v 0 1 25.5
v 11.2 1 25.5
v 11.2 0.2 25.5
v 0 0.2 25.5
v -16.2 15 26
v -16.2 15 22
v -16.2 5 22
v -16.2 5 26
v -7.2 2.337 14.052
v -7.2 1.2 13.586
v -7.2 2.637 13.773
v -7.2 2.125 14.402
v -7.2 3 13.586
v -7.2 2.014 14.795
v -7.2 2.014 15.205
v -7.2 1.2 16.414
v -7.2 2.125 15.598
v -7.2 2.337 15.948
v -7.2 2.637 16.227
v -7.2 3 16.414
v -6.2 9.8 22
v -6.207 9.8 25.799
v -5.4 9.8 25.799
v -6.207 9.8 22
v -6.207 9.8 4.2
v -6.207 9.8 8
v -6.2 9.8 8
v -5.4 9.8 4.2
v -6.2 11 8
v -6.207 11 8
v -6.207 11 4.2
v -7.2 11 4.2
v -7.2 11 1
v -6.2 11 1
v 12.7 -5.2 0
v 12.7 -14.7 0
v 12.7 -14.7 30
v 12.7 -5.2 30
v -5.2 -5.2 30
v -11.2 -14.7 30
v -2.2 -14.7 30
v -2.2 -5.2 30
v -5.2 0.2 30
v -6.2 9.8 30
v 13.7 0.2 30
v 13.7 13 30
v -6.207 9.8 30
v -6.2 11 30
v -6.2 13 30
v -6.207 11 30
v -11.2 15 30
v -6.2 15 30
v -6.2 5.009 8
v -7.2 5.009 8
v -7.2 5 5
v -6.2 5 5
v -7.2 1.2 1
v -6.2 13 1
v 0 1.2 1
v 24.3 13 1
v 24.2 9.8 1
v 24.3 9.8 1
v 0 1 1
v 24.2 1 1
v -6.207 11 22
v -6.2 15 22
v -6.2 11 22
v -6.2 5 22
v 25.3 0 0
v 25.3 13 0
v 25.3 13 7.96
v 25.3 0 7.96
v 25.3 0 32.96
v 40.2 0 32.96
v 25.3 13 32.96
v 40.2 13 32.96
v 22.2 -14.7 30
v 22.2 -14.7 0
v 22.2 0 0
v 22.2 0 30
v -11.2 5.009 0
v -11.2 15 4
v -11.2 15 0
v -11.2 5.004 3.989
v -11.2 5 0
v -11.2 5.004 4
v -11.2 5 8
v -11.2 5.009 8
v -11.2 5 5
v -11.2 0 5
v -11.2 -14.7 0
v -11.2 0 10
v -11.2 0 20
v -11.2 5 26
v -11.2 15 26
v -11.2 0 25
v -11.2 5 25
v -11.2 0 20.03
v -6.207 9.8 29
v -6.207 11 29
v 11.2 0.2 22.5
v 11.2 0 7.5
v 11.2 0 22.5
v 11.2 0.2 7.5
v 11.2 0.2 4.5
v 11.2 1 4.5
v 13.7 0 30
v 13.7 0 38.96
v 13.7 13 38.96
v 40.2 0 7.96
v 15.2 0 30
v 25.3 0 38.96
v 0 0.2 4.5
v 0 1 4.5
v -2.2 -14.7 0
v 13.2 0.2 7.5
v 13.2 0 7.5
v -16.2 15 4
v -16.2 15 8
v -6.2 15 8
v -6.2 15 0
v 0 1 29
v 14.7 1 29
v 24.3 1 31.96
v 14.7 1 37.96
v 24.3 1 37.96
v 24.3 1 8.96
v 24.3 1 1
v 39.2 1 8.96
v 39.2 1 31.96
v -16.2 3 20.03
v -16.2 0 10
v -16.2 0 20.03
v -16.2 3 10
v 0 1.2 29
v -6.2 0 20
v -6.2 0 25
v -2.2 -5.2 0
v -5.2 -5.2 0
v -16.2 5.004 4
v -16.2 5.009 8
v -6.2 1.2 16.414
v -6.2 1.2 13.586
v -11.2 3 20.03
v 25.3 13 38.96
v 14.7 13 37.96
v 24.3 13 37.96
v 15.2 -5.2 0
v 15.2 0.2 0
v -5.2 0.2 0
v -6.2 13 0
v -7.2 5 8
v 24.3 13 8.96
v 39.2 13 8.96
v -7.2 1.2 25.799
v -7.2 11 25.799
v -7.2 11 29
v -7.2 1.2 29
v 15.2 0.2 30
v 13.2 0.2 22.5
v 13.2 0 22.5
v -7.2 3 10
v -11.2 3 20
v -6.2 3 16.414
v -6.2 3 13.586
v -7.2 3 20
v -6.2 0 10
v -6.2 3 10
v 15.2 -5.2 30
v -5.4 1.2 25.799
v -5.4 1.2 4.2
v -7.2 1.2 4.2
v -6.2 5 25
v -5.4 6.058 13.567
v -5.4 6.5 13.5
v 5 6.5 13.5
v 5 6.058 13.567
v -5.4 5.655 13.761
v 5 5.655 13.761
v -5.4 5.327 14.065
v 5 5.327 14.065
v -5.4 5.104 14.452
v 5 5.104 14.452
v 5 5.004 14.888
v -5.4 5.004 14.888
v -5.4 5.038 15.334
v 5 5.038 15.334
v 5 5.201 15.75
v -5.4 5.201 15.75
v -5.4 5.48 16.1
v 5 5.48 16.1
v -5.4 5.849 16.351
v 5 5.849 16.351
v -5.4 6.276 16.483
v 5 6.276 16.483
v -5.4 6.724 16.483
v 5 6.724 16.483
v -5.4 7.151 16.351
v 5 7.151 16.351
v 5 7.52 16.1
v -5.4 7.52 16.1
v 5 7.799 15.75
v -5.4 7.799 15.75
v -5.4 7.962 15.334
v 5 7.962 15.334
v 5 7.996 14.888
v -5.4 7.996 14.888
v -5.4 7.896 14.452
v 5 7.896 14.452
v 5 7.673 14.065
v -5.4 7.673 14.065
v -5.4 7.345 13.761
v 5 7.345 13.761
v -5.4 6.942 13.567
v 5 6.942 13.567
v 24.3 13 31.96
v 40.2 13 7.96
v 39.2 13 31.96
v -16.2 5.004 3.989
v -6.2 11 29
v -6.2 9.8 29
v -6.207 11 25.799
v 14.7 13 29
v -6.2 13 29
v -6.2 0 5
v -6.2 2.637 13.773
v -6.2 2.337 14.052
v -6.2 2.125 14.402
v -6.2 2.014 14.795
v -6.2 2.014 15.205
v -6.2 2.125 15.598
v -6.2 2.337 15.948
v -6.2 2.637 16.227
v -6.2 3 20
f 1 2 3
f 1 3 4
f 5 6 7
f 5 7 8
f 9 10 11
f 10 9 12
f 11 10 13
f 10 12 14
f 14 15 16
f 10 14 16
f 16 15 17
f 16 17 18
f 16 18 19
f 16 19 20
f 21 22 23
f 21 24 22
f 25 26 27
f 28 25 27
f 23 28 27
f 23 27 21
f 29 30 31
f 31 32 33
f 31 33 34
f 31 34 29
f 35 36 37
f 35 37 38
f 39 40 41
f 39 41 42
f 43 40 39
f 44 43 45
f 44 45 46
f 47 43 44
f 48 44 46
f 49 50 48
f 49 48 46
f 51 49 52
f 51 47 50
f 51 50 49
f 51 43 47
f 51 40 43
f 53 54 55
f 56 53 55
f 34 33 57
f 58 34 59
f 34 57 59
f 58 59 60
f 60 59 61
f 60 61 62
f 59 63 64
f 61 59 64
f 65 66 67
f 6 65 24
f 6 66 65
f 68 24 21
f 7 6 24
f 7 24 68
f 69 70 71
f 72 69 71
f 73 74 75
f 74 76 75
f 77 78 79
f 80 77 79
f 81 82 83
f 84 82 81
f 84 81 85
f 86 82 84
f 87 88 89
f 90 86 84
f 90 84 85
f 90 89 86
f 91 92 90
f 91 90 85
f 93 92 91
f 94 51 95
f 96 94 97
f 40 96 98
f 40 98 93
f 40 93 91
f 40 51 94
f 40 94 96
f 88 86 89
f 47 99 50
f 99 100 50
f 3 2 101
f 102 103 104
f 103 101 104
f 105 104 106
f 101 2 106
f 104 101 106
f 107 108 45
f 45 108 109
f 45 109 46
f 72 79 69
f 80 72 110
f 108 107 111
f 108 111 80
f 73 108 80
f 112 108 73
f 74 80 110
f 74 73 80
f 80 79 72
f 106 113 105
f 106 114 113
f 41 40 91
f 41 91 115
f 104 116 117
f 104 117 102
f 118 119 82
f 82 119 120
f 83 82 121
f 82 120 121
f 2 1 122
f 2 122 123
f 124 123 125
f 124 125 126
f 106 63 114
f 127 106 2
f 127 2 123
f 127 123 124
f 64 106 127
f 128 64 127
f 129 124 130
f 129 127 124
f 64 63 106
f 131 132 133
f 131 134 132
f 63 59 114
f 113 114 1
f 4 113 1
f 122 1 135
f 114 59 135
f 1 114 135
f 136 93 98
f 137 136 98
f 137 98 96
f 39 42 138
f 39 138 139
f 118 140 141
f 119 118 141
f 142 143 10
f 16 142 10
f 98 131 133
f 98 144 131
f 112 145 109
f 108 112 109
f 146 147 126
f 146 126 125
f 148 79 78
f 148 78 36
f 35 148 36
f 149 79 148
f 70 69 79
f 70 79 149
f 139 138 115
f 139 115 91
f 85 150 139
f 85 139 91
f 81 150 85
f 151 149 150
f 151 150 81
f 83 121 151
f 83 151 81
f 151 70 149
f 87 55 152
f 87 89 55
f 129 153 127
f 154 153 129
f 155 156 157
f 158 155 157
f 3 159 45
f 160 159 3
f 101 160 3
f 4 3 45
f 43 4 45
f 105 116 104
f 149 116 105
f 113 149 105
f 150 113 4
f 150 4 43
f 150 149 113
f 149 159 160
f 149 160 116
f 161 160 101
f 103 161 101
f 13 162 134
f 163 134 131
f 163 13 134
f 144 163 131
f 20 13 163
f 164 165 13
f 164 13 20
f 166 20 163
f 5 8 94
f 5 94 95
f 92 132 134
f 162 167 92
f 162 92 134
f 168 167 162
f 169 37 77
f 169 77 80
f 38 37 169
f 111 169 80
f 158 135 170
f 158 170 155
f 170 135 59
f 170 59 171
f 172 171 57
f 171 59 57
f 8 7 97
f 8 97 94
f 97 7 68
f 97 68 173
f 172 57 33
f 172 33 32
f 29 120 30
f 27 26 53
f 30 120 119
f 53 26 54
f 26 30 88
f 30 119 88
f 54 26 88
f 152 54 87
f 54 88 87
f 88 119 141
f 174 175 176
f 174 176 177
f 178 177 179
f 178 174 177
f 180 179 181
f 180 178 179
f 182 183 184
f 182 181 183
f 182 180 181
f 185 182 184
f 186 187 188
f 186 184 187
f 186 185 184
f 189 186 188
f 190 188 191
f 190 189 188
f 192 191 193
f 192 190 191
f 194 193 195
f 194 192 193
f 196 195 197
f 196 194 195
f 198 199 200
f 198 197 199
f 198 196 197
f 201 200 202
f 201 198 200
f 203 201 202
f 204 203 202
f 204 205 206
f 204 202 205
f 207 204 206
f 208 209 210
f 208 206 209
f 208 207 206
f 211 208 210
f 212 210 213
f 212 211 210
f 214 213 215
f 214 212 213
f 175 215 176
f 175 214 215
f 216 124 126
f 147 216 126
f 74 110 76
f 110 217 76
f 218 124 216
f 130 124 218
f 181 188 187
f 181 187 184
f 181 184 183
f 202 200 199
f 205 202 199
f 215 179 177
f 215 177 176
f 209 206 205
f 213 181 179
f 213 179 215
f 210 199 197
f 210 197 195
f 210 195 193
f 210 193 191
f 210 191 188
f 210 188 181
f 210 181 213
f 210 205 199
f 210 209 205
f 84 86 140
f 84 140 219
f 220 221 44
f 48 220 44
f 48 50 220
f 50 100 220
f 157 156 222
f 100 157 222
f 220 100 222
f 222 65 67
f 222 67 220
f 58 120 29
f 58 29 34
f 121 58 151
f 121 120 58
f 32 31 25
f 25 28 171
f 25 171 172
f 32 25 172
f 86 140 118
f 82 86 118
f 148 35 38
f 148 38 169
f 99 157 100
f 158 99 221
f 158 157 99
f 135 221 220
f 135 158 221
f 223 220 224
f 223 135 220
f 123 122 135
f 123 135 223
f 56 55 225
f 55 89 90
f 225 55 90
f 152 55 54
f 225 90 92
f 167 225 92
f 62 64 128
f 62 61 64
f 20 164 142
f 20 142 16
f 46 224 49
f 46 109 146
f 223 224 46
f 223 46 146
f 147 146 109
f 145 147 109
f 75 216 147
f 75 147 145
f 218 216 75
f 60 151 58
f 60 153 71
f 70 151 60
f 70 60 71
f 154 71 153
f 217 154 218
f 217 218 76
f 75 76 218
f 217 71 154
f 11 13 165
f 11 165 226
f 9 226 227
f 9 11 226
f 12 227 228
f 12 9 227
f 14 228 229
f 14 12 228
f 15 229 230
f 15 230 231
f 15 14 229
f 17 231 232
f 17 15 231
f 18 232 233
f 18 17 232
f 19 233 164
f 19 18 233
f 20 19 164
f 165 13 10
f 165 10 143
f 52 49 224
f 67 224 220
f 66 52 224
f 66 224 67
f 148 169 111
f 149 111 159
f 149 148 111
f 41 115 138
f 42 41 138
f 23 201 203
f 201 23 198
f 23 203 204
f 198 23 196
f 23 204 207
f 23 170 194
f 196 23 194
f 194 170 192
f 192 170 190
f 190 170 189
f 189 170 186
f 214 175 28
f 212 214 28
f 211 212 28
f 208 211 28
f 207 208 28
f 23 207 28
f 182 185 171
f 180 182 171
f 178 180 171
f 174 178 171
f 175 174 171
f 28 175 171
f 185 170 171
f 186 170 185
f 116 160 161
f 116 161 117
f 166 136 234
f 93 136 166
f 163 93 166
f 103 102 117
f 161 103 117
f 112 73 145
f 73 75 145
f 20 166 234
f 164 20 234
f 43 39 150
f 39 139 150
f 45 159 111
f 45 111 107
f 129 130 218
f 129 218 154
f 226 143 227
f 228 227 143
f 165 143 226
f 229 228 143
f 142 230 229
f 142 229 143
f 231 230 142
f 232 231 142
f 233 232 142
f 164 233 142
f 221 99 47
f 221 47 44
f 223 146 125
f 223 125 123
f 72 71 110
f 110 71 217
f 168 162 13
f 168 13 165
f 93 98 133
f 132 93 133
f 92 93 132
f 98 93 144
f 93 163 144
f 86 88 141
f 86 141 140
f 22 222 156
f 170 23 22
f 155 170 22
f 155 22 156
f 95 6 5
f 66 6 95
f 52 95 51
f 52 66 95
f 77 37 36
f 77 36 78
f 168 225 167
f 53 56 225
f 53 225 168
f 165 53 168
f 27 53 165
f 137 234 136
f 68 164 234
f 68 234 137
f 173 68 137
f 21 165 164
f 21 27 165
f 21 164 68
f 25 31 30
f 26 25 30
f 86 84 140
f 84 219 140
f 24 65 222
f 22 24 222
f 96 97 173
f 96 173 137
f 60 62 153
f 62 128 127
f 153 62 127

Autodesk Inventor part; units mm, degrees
ref_plane "YZ Plane" through (0, 0, 0) normal (1, 0, 0) x (0, 1, 0)
ref_plane "XZ Plane" through (0, 0, 0) normal (0, 1, 0) x (-1, 0, 0)
ref_plane "XY Plane" through (0, 0, 0) normal (0, 0, 1) x (1, 0, 0)
sketch "Esboço2" plane through (0, 0, 0) normal (0, 0, 1) x (1, 0, 0)
  line L0 (0, 0) -> (-5, 0)
  line L1 (-5, 0) -> (-5, -5)
  line L2 (-5, -5) -> (-2, -5)
  line L3 (-2, -5) -> (-2, -15)
  line L4 (-2, -15) -> (-5.6275, -15)
  line L5 (-5.6275, -15) -> (-5.6275, -20)
  line L6 (-5.6275, -20) -> (0, -20)
  line L7 (0, -20) -> (0, -17.5)
  line L8 (0, -17.5) -> (10, -17.5)
  line L9 (10, -17.5) -> (10, -20)
  line L10 (10, -20) -> (15, -20)
  line L11 (15, -20) -> (15, -15)
  line L12 (15, -15) -> (12.5, -15)
  line L13 (12.5, -15) -> (12.5, -5)
  line L14 (12.5, -5) -> (15, -5)
  line L15 (15, 0) -> (15, -5)
  line L16 (15, 0) -> (10, 0)
  line L17 (10, 0) -> (10, -2.5)
  line L18 (10, -2.5) -> (0, -2.5)
  line L19 (0, -2.5) -> (0, 0)
  line L20 (-2.2, -14.8) -> (-2.2, -5.2)
  line L21 (-2.2, -5.2) -> (-4.7, -5.2)
  line L22 (-2.2, -14.8) -> (-4.7, -14.8)
  line L23 (-2.2, -14.8) -> (-5.8275, -14.8)
  line L24 (-5.8275, -14.8) -> (-5.8275, -20)
  line L25 (-5.8275, -20) -> (-5.8275, -20.2)
  line L26 (-5.8275, -20.2) -> (0.2, -20.2)
  line L27 (0.2, -20.2) -> (0.2, -17.7)
  line L28 (0.2, -17.7) -> (9.8, -17.7)
  line L29 (9.8, -17.7) -> (9.8, -18.4636)
  line L30 (9.8, -18.4636) -> (9.8, -20.2)
  line L31 (9.8, -20.2) -> (15.2, -20.2)
  line L32 (15.2, -20.2) -> (15.2, -14.8)
  line L33 (15.2, -14.8) -> (12.7, -14.8)
  line L34 (12.7, -14.8) -> (12.7, -5.2)
  line L35 (12.7, -5.2) -> (15.1265, -5.2)
  line L36 (15.1265, -5.2) -> (15.2, -5.2)
  line L37 (15.2, -5.2) -> (15.2, 0)
  line L38 (-4.7, -5.2) -> (-5.2, -5.2)
  line L39 (-5.2, -5.2) -> (-5.2, 0)
  line L40 (-12.2, 0) -> (-12.2, -24.2)
  line L41 (-12.2, -24.2) -> (22.2, -24.2)
  line L42 (22.2, -24.2) -> (22.2, 0)
  line L43 (15.2, 0) -> (15.2, 0.2)
  line L44 (15.2, 0.2) -> (13.2, 0.2)
  line L45 (22.2, 0) -> (22.2, 1)
  line L46 (22.2, 1) -> (13.2, 1)
  line L47 (13.2, 1) -> (13.2, 0.2)
  line L48 (-12.2, 0) -> (-12.2, 1.2)
  line L49 (-5.2, 0) -> (-5.2, 0.2)
  line L50 (-5.2, 0.2) -> (-3.2, 0.2)
  line L51 (-3.2, 1.2) -> (-12.2, 1.2)
  line L52 (-3.2, 1.2) -> (0, 1.2)
  line L53 (0, 1.2) -> (0, 0.2)
  line L54 (0, 0.2) -> (-3.2, 0.2)
  line L55 (0.5946, -2.5) -> (0.5946, 9.5)
  line L56 (0.5946, 9.5) -> (9.5946, 9.5)
  line L57 (9.5946, 9.5) -> (9.5946, -2.5)
  line L58 (0.5946, -2.5) -> (9.5946, -2.5)
  dimension "d0" = 5
  dimension "d1" = 5
  dimension "d2" = 3
  dimension "d3" = 10
  dimension "d4" = 5
  dimension "d5" = 2.5
  dimension "d6" = 10
  dimension "d7" = 5
  dimension "d8" = 5
  dimension "d9" = 10
  dimension "d11" = 5
  dimension "d12" = 0.2
  dimension "d13" = 0.2
  dimension "d14" = 0.2
  dimension "d15" = 0.2
  dimension "d16" = 0.2
  dimension "d17" = 0.2
  dimension "d19" = 0.2
  dimension "d20" = 0.2
  dimension "d21" = 0.2
  dimension "d22" = 0.2
  dimension "d23" = 0.2
  dimension "d24" = 0.2
  dimension "d25" = 0.2
  dimension "d26" = 0.2
  dimension "d27" = 0.2
  dimension "d28" = 7
  dimension "d29" = 4
  dimension "d30" = 7
  dimension "d31" = 0.2
  dimension "d32" = 2
  dimension "d33" = 1
  dimension "d34" = 0.2
  dimension "d35" = 2
  dimension "d36" = 1
  dimension "d39" = 12
  dimension "d40" = 9
extrude "Extrusão1" add sketch "Esboço2" along normal blind 30 contours L22 L23 L24 L25 L26 L27 L28 L29 L30 L31 L32 L33 L34 L35 L36 L37 L43 L44 L47 L46 L45 L42 L41 L40 L48 L51 L52 L53 L54 L50 L49 L39 L38 L21 L20
sketch "Esboço4" plane through (-12.2, -24.2, 0) normal (-1, 0, 0) x (0, 0, 1)
  circle A0 centre (30, 27.7) radius 6 projected
  line L0 (30, 27.7) -> (0, 27.7)
  line L1 (15, 27.7) -> (15, 25.4)
  line L2 (0, 25.4) -> (30, 25.4) projected
  line L3 (0, 27.7) -> (30, 27.7)
  line L4 (30, 27.7) -> (30, 25.4)
  line L5 (30, 25.4) -> (0, 25.4)
  line L6 (0, 25.4) -> (0, 27.7)
  point P0 (0, 24.2)
extrude "Extrusão2" add sketch "Esboço4" against normal blind 5 contours L0 L4 L2 A0 | A0 L2 L1 L0 | L1 L2 L6 L0 picked at (28.1528, 26.1667)
sketch "Esboço5" plane through (-7.2, -24.2, 0) normal (1, 0, 0) x (0, 0, -1)
  line L0 (-30, 27.7) -> (0, 27.7) projected
  line L1 (0, 27.7) -> (-15, 27.7)
  circle A0 centre (-15, 27.7) radius 1.5
  point P0 (0, 24.2)
  dimension "d48" = 3
extrude "Extrusão3" add sketch "Esboço5" along normal blind 13.7
sketch "Esboço6" plane through (-7.2, -24.2, 0) normal (-1, 0, 0) x (0, 0, 1)
  line L0 (13.5, 27.7) -> (16.5, 27.7) projected
  circle A0 centre (15, 27.7) radius 1.5
  point P0 (0, 24.2)
extrude "Extrusão4" add sketch "Esboço6" along normal blind 5 contours A0 L0 picked at (15.4855, 27.8197)
sketch "Esboço7" plane through (-12.2, -24.2, 0) normal (-1, 0, 0) x (0, 0, 1)
  circle A0 centre (30, 27.7) radius 6 projected
  line L0 (13.5, 27.7) -> (0, 27.7) projected
  line L1 (30, 33.7) -> (0, 33.7)
  line L2 (0, 33.7) -> (0, 27.7)
  line L3 (0, 27.7) -> (30, 27.7)
  line L4 (30, 27.7) -> (30, 33.7)
  point P0 (0, 24.2)
extrude "Extrusão5" add sketch "Esboço7" against normal blind 5 contours L4 L3 A0 | A0 L3 L0 L2 L1 picked at (26.0501, 28.145)
sketch "Esboço8" plane through (-12.2, -24.2, 0) normal (-1, 0, 0) x (0, 0, 1)
  line L0 (30, 33.7) -> (0, 33.7) projected
  line L1 (0, 33.7) -> (0, 35.2)
  line L2 (0, 35.2) -> (30, 35.2)
  line L3 (30, 35.2) -> (30, 33.7)
  line L4 (30, 33.7) -> (0, 33.7)
  line L5 (30, 33.7) -> (30, 25.4) projected
  point P0 (0, 24.2)
  dimension "d55" = 1.5
extrude "Extrusão6" add sketch "Esboço8" against normal blind 5
sketch "Esboço10" plane through (13.2, 1, 0) normal (0, 1, 0) x (1, 0, 0)
  line L0 (-6.7, -16.5) -> (-6.7, -13.5) projected
  line L1 (-6.7, -15) -> (-6.7, -21.5)
  line L2 (-6.7, -15) -> (-6.7, -8.5)
  line L3 (0, 0) -> (0, -30) projected
  line L4 (0, 0) -> (-13.2, 0)
  line L5 (-3.4, 0) -> (-13, 0) projected
  line L6 (-13.2, 0) -> (-13.2, -8.5)
  line L7 (-13, 0) -> (-13, -30) projected
  line L8 (-13.2, -8.5) -> (0, -8.5)
  line L9 (0, -8.5) -> (0, 0)
  line L10 (2, -30) -> (-3.4, -30) projected
  line L11 (0, -30) -> (0, -21.5)
  line L12 (0, -21.5) -> (-13.2, -21.5)
  line L13 (-13.2, 0) -> (-13.2, -30) projected
  line L14 (-13.2, -21.5) -> (-13.2, -30)
  line L15 (-13.2, -30) -> (0, -30)
  dimension "d58" = 6.5
  dimension "d59" = 6.5
extrude "Extrusão7" add sketch "Esboço10" against normal blind 0.8 contours L12 L3 L10 L15 L7 | L7 L15 L13 L12 | L8 L7 L4 L3 | L8 L6 L4 L7
sketch "Esboço15" plane through (22.2, -24.2, 0) normal (1, 0, 0) x (0, 0, -1)
  line L0 (-30, 25.2) -> (-21.5, 25.2) projected
  line L1 (-30, 25.2) -> (0, 25.2)
  line L2 (0, 25.2) -> (0, 24.2)
  line L3 (0, 24.2) -> (-30, 24.2)
  line L4 (-30, 24.2) -> (-30, 25.2)
extrude "Extrusão10" add sketch "Esboço15" along normal blind 3
sketch "Esboço16" plane through (0, 1, 8.5) normal (0, 1, 0) x (1, 0, 0)
  line L0 (22.2, -21.5) -> (25.2, -21.5) projected
  line L1 (25.2, 8.5) -> (23.7, 8.5)
  line L2 (23.7, -21.5) -> (25.2, -21.5)
  line L3 (0, -21.5) -> (25.2, -21.5) projected
  line L4 (-12.2, -21.5) -> (-12.2, 8.5) projected
  line L5 (25.2, -21.5) -> (-12.2, -21.5)
  line L6 (-12.2, -21.5) -> (-12.2, -20.5)
  line L7 (-12.2, -20.5) -> (25.2, -20.5)
  line L8 (25.2, -20.5) -> (25.2, -21.5)
  line L9 (0, 8.5) -> (25.2, 8.5) projected
  line L10 (25.2, 8.5) -> (-12.2, 8.5)
  line L11 (-12.2, 8.5) -> (-12.2, 7.5)
  line L12 (-12.2, 7.5) -> (25.2, 7.5)
  line L13 (25.2, 7.5) -> (25.2, 8.5)
  line L14 (25.2, 8.5) -> (24.2, 8.5)
  line L15 (24.2, 8.5) -> (24.2, -21.5)
  line L16 (24.2, -21.5) -> (25.2, -21.5)
  line L17 (25.2, -21.5) -> (25.2, 8.5)
  point P0 (24.2, 7.5)
  point P1 (24.2, -20.5)
  dimension "d70" = 1
  dimension "d71" = 1
  dimension "d73" = 1
extrude "Extrusão11" add sketch "Esboço16" along normal blind 10 contours L3 L5 L4 L7 L15 L0 | L15 L7 L8 L0 | L15 L12 L17 L7 | L15 L1 L13 L12 | L12 L4 L10 L9 L1 L15
sketch "Esboço18" plane through (0, 0, 30) normal (0, 0, 1) x (1, 0, 0)
  line L0 (-12.2, 11) -> (-12.2, -24.2) projected
  line L1 (-12.2, -24.2) -> (22.2, -24.2) projected
  line L2 (-12.2, 11) -> (-11.2, 11)
  line L3 (-11.2, 11) -> (-11.2, -24.2)
  line L4 (-11.2, -24.2) -> (-12.2, -24.2)
  line L5 (-12.2, -24.2) -> (-12.2, 11)
  point P0 (0, 0)
  dimension "d76" = 1
extrude "Extrusão12" cut sketch "Esboço18" against normal through all
sketch "Esboço20" plane through (0, 1, 8.5) normal (0, 1, 0) x (1, 0, 0)
  line L0 (0, 7.5) -> (0, -20.5) projected
  line L1 (12.7, 8.5) -> (12.7, -21.5) projected
  line L2 (0, 0) -> (12.7, 0)
  line L3 (12.7, 0) -> (12.7, 1)
  line L4 (12.7, 1) -> (0, 1)
  line L5 (0, 1) -> (0, 0)
  line L6 (0, 0) -> (13.2, 0) projected
  line L7 (12.7, 1) -> (13.2, 1)
  line L8 (13.2, 1) -> (13.2, 0)
  line L9 (13.2, 0) -> (12.7, 0)
  line L10 (12.7, 0) -> (12.7, 1)
  line L11 (13.2, 0) -> (13.2, -13) projected
  line L12 (0, -20.5) -> (0, -13) projected
  line L13 (13.2, -13) -> (0, -13)
  line L14 (0, -13) -> (0, -14)
  line L15 (0, -14) -> (13.2, -14)
  line L16 (13.2, -14) -> (13.2, -13)
  point P0 (0, 8.5)
  point P1 (0, -14)
  point P2 (0, -13)
  point P3 (0, 1)
  dimension "d79" = 1
  dimension "d80" = 1
extrude "Extrusão13" cut sketch "Esboço20" against normal blind 1 contours L4 L1 L2 L0 | L7 L8 L6 L1 | L13 L1 L15 L0 | L13 L16 L15 L1
sketch "Esboço23" plane through (0, 1, 29) normal (0, 1, 0) x (1, 0, 0)
  line L0 (13.2, 21.5) -> (13.2, 6.5) projected
  line L1 (13.2, 6.5) -> (17.9377, 6.5)
  line L2 (17.9377, 6.5) -> (22.2, 6.5)
  line L3 (22.2, 29) -> (22.2, -1) projected
  line L4 (13.2, 6.5) -> (23.7, 6.5)
  line L5 (13.2, 21.5) -> (0, 21.5) projected
  line L6 (13.2, 21.5) -> (23.7, 21.5)
  line L7 (13.2, 21.5) -> (13.2, 6.5)
  line L8 (23.7, 6.5) -> (23.7, 21.5)
  point P0 (0, 29)
  point P1 (22.2, 21.5)
  point P2 (22.2, 6.5)
  dimension "d91" = 10.5
extrude "Extrusão16" cut sketch "Esboço23" against normal blind 0.5
sketch "Esboço29" plane through (0, 0.5, 29) normal (0, 1, 0) x (1, 0, 0)
  line L0 (13.2, 6.5) -> (13.2, 21.5) projected
  line L1 (13.2, 21.5) -> (10.2, 21.5)
  line L2 (0, 21.5) -> (23.7, 21.5) projected
  line L3 (10.2, 21.5) -> (10.2, 6.5)
  line L4 (23.7, 6.5) -> (0, 6.5) projected
  line L5 (13.2, 6.5) -> (10.2, 6.5)
  line L6 (10.2, 21.5) -> (13.2, 21.5)
  point P0 (0, 29)
  dimension "d102" = 3
extrude "Extrusão20" add sketch "Esboço29" against normal blind 0.5
sketch "Esboço38" plane through (-11.2, -24.2, 30) normal (-1, 0, 0) x (0, 0, 1)
  line L0 (0, 35.2) -> (0, 0) projected
  line L1 (-30, 24.2) -> (0, 24.2) projected
  line L2 (0, 24.2) -> (-30, 24.2)
  line L3 (-30, 35.2) -> (0, 35.2) projected
  line L4 (-25, 35.2) -> (-25, 24.2)
  line L5 (-5, 35.2) -> (-5, 24.2)
  line L6 (-5, 24.2) -> (-10, 24.2)
  line L7 (-7.5, 24.2) -> (-22.5, 24.2) projected
  line L8 (-10, 24.2) -> (-10, 27.2)
  line L9 (-10, 27.2) -> (-20, 27.2)
  line L10 (-20, 27.2) -> (-20, 24.2)
  line L11 (-5, 24.2) -> (-5, 29.2)
  line L12 (-5, 29.2) -> (-8, 29.2)
  line L13 (-8, 29.2) -> (-8, 35.2)
  line L14 (-25, 24.2) -> (-25, 29.2)
  line L15 (-25, 29.2) -> (-22, 29.2)
  line L16 (-22, 29.2) -> (-22, 35.2)
  line L17 (-22, 35.2) -> (-8, 35.2)
  point P0 (-5, 24.2)
  dimension "d128" = 20
  dimension "d129" = 5
  dimension "d130" = 5
  dimension "d131" = 3
  dimension "d132" = 10
  dimension "d133" = 5
  dimension "d134" = 3
  dimension "d135" = 3
extrude "Extrusão25" cut sketch "Esboço38" against normal blind 5 contours L1 L8 L9 L10 L4 L15 L16 L3 L13 L12 L5
sketch "Esboço39" plane through (-7.2, 1.2, 29) normal (0, 1, 0) x (1, 0, 0)
  line L0 (1, 12.5) -> (13.7, 12.5) projected
  line L1 (1, 12.5) -> (1, 4)
  line L2 (1, 4) -> (0, 4) projected
  line L3 (1, 4) -> (0, 4)
  line L4 (1, 24) -> (1, 19) projected
  line L5 (1, 12.5) -> (1, 24)
  line L6 (1, 24) -> (0, 24)
  line L7 (0, 24) -> (0, 24.1)
  line L8 (0, 28) -> (0, 21) projected
  line L9 (0, 24.1) -> (1.1, 24.1)
  line L10 (0, 4) -> (0, 0) projected
  line L11 (0, 4) -> (0, 3.9)
  line L12 (0, 3.9) -> (1.1, 3.9)
  line L13 (1.1, 3.9) -> (1.1, 24.1)
  point P0 (7.2, 29)
  dimension "d138" = 0.1
  dimension "d139" = 1.1
  dimension "d140" = 0.1
extrude "Extrusão26" add sketch "Esboço39" along normal blind 9.8
sketch "Esboço40" plane through (-11.2, 3, 20) normal (0, 1, 0) x (1, 0, 0)
  line L0 (4, 3.5858) -> (4, 0) projected
  line L1 (5, 3.5858) -> (4, 3.5858) projected
  line L2 (4, 0) -> (5, 0)
  line L3 (5, 0) -> (5, 3.5858)
  line L4 (5, 3.5858) -> (4, 3.5858)
  line L5 (4, 3.5858) -> (4, 0)
  line L6 (4, 6.4142) -> (5, 6.4142) projected
  line L7 (4, 6.4142) -> (5, 6.4142)
  line L8 (5, 6.4142) -> (5, 10)
  line L9 (5, 10) -> (4, 10)
  line L10 (4, 10) -> (4, 6.4142)
  point P0 (11.2, 20)
extrude "Extrusão27" add sketch "Esboço40" against normal blind 10
sketch "Esboço41" plane through (-7.2, 1.2, 29) normal (0, 1, 0) x (1, 0, 0)
  line L0 (1, 19) -> (1, 15.4142) projected
  line L1 (1, 19) -> (1.8, 19)
  line L2 (1.3725, 29) -> (1.3725, -1) projected
  line L3 (1, 24) -> (1, 4) projected
  line L4 (1, 9.0006) -> (1.8, 9.0006)
  line L5 (1.8, 19) -> (1.8, 9.0006)
  line L6 (1.8, 9.0006) -> (1.8, 3.2006)
  line L7 (1.8, 3.2006) -> (0, 3.2006)
  line L8 (1.8, 19) -> (1.8, 24.8)
  line L9 (1.8, 24.8) -> (0, 24.8)
  line L10 (0, 28) -> (0, 24.1) projected
  line L11 (0, 24.8) -> (0, 24.1)
  line L12 (1.1, 24.1) -> (0, 24.1) projected
  line L13 (0, 24.1) -> (1.1, 24.1)
  line L14 (0, 3.9) -> (0, 0) projected
  line L15 (0, 3.2006) -> (0, 3.9)
  line L16 (0, 3.9) -> (1.1, 3.9) projected
  line L17 (0, 3.9) -> (1.1, 3.9)
  line L18 (1.1, 3.9) -> (1.1, 9.0006)
  line L19 (1.1, 3.9) -> (1.1, 24.1) projected
  line L20 (1.1, 3.9) -> (1.1, 24.1)
  line L21 (0, 28) -> (0, 24.1) projected
  line L22 (0, 24.1) -> (1.1, 24.1)
  line L23 (0, 24.1) -> (0, 24.8)
  point P0 (7.2, 29)
  point P1 (1.1, 19)
  dimension "d149" = 5.8
  dimension "d150" = 5.8
extrude "Extrusão28" add sketch "Esboço41" along normal blind 9.8
sketch "Esboço42" plane through (-7.2, -24.2, 0) normal (1, 0, 0) x (0, 0, -1)
  line L0 (-22, 35.2) -> (-25, 35.2) projected
  line L1 (-22, 35.2) -> (-22, 29.2)
  line L2 (-22, 29.2) -> (-25, 29.1118)
  line L3 (-25, 25.4) -> (-25, 35.2) projected
  line L4 (-25, 35.2) -> (-25, 35.2) projected
  line L5 (-25, 29.2) -> (-22, 29.2) projected
  line L6 (-25, 35.2) -> (-25, 29.2)
  line L7 (-22, 29.2) -> (-22, 35.2) projected
  line L8 (-25, 35.2) -> (-22, 35.2)
  point P0 (0, 24.2)
extrude "Extrusão29" add sketch "Esboço42" along normal blind 1.5 contours L1 L5 L3 L0
sketch "Esboço43" plane through (-7.2, -24.2, 0) normal (1, 0, 0) x (0, 0, -1)
  line L0 (-5, 35.2) -> (-5, 35.4) projected
  line L1 (-8, 35.2) -> (-5, 35.2)
  line L2 (-5, 35.2) -> (-8, 35.2) projected
  line L3 (-8, 35.2) -> (-7.9375, 31.75)
  line L4 (-8, 35.2) -> (-8, 29.2086)
  line L5 (-8, 29.2086) -> (-5, 29.2)
  line L6 (-5, 29.2) -> (-5, 35.2)
  point P0 (0, 24.2)
extrude "Extrusão30" add sketch "Esboço43" along normal blind 1.5
sketch "Esboço44" plane through (-11.2, -24.2, 30) normal (-1, 0, 0) x (0, 0, 1)
  line L0 (-7.5, 24.2) -> (-22.5, 24.2) projected
  line L1 (-20, 27.2) -> (-9.9695, 27.2)
  line L2 (-9.9695, 27.2) -> (-9.9695, 24.2)
  line L3 (-9.9695, 24.2) -> (-20, 24.2)
  line L4 (-20, 24.2) -> (-20, 27.2)
  point P0 (-30, 24.2)
extrude "Extrusão31" add sketch "Esboço44" along normal blind 5
sketch "Esboço45" plane through (-11.2, -24.2, 30) normal (-1, 0, 0) x (0, 0, 1)
  line L0 (-8, 35.2) -> (-8, 29.2) projected
  line L1 (-8, 29.2) -> (-8, 39.2)
  line L2 (-8, 39.2) -> (0, 39.2)
  line L3 (-8, 35.2) -> (0, 35.2) projected
  line L4 (0, 39.2) -> (0, 35.2)
  line L5 (0, 35.2) -> (-8, 35.2)
  line L6 (-30, 35.2) -> (-22, 35.2) projected
  line L7 (-22, 35.2) -> (-22, 39.2)
  line L8 (-22, 39.2) -> (-30, 39.2)
  line L9 (-30, 39.2) -> (-30, 35.2)
  line L10 (-8, 29.2) -> (-5, 29.2) projected
  line L11 (-8, 29.2) -> (0, 29.2)
  line L12 (0, 29.2) -> (0, 39.2)
  line L13 (-22, 35.2) -> (-22, 29.2086) projected
  line L14 (-22, 35.2) -> (-22, 29.2086)
  line L15 (-22, 29.2086) -> (-30, 29.2)
  line L16 (-30, 0) -> (-30, 35.2) projected
  line L17 (-30, 39.2) -> (-30, 29.2)
  point P0 (-30, 24.2)
  dimension "d157" = 10
extrude "Extrusão32" add sketch "Esboço45" along normal blind 5
sketch "Esboço46" plane through (-11.2, -24.2, 30) normal (1, 0, 0) x (0, 0, -1)
  line L0 (0, 39.2) -> (8, 39.2) projected
  line L1 (8, 39.2) -> (8, 35.2) projected
  line L2 (0, 39.2) -> (8, 39.2)
  line L3 (8, 39.2) -> (8, 35.2)
  line L4 (0, 35.2) -> (0, 39.2) projected
  line L5 (8, 35.2) -> (0, 35.2)
  line L6 (0, 35.2) -> (0, 39.2)
  line L7 (22, 29.2086) -> (22, 39.2) projected
  line L8 (22, 39.2) -> (30, 39.2)
  line L9 (30, 35.2) -> (22, 35.2) projected
  line L10 (30, 39.2) -> (30, 35.2)
  line L11 (30, 35.2) -> (22, 35.2)
  line L12 (22, 35.2) -> (22, 39.2)
  point P0 (30, 24.2)
extrude "Extrusão33" add sketch "Esboço46" along normal blind 5
sketch "Esboço47" plane through (-16.2, -24.2, 30) normal (-1, 0, 0) x (0, 0, 1)
  line L0 (0, 29.2) -> (-5, 29.2) projected
  line L1 (-8, 29.2) -> (-5, 29.2)
  line L2 (-8, 29.2) -> (-4, 29.2)
  line L3 (-4, 29.2) -> (-4, 39.2)
  line L4 (0, 39.2) -> (-8, 39.2) projected
  line L5 (0, 39.2) -> (-4, 39.2)
  line L6 (0, 29.2) -> (0, 39.2) projected
  line L7 (0, 39.2) -> (0, 29.2)
  line L8 (0, 29.2) -> (-4, 29.2)
  line L9 (-25, 29.2) -> (-22, 29.2) projected
  line L10 (-22, 29.2) -> (-26, 29.2043)
  line L11 (-22, 29.2086) -> (-30, 29.2) projected
  line L12 (-26, 29.2043) -> (-26, 39.2)
  line L13 (-30, 39.2) -> (-22, 39.2) projected
  line L14 (-30, 39.2) -> (-26, 39.2)
  line L15 (-30, 35.2) -> (-30, 39.2) projected
  line L16 (-30, 39.2) -> (-30, 29.2086)
  line L17 (-30, 29.2086) -> (-26, 29.2043)
  point P0 (-30, 24.2)
  dimension "d163" = 4
extrude "Extrusão34" cut sketch "Esboço47" against normal blind 5
sketch "Esboço48" plane through (-16.2, 5.0043, 4) normal (0, 1, 0.0011) x (1, 0, 0)
  line L0 (5, 4) -> (5, 4.0107) projected
  line L1 (5, 0) -> (5, 4) projected
  line L2 (5, 4.0107) -> (5, 0)
  line L3 (5, 0.0107) -> (0, 0.0107) projected
  line L4 (5, 0) -> (0, 0.0107)
  line L5 (0, 4) -> (5, 4) projected
  line L6 (0.0086, 4.0107) -> (5, 4.0107)
  line L7 (0, 0.0107) -> (0, 0) projected
  line L8 (0, 0) -> (-1.8529, 0)
  line L9 (-1.8529, 0) -> (-1.8529, 4)
  line L10 (-1.8529, 4) -> (0, 4)
  point P0 (16.2, 3.9946)
extrude "Extrusão35" cut sketch "Esboço48" against normal blind 5 contours L3 L7 L8 L9 L10 L5 L1
sketch "Esboço50" plane through (22.2, -24.2, 0) normal (0, -1, 0) x (1, 0, 0)
  line L0 (-28.4, 0) -> (-38.4, 0) projected
  line L1 (0, 30) -> (-33.4, 30)
  line L2 (-33.4, 30) -> (-33.4, 0)
  line L3 (-33.4, 0) -> (0, 0)
  line L4 (0, 0) -> (0, 30)
  point P0 (-22.2, 0)
extrude "Extrusão36" cut sketch "Esboço50" against normal blind 9.5
sketch "Esboço51" plane through (25.2, 11, 30) normal (0, 1, 0) x (1, 0, 0)
  line L0 (-36.4, 0) -> (-27.4, 0) projected
  line L1 (-31.407, 0) -> (0, 0)
  line L2 (0, 0) -> (0, 30)
  line L3 (0, 30) -> (-31.407, 30)
  line L4 (-31.407, 30) -> (-31.407, 0)
  line L5 (0, 30) -> (-31.407, 30)
  line L6 (-31.407, 30) -> (-31.407, 50)
  line L7 (-31.407, 50) -> (0, 50)
  line L8 (0, 50) -> (0, 30)
  point P0 (-25.2, 30)
  dimension "d172" = 20
extrude "Extrusão37" cut sketch "Esboço51" against normal blind 1.2 contours L4 L3 L2 L1 L0
sketch "Esboço52" plane through (0, 1, 29) normal (0, 1, 0) x (1, 0, 0)
  line L0 (10.2, 21.5) -> (13.2, 21.5) projected
  line L1 (10.2, 6.5) -> (10.2, 21.5) projected
  line L2 (10.2, 21.5) -> (10.2, 6.5)
  line L3 (13.2, 6.5) -> (10.2, 6.5) projected
  line L4 (10.2, 6.5) -> (10.2, 14)
  line L5 (10.2, 14) -> (0, 14)
  line L6 (0, 21.5) -> (0, 6.5) projected
  line L7 (10.2, 14) -> (10.2, 21.5)
  line L8 (10.2, 14) -> (10.2, 24.5)
  line L9 (10.2, 14) -> (10.2, 3.5)
  line L10 (10.2, 3.5) -> (0, 3.5)
  line L11 (0, 28) -> (0, 0) projected
  line L12 (0, 3.5) -> (0, 24.5)
  line L13 (0, 21.5) -> (0, 28) projected
  line L14 (0, 24.5) -> (10.2, 24.5)
  point P0 (0, 29)
  point P1 (10.2, 6.5)
  point P2 (10.2, 21.5)
  dimension "d175" = 10.5
  dimension "d176" = 10.5
  dimension "d177" = 21
extrude "Extrusão38" cut sketch "Esboço52" against normal blind 10
sketch "Esboço53" plane through (0, 0.5, 29) normal (0, 1, 0) x (1, 0, 0)
  line L0 (10.2, 6.5) -> (13.2, 6.5) projected
  line L1 (23.7, 21.5) -> (23.7, 6.5) projected
  line L2 (10.2, 6.5) -> (23.7, 6.5)
  line L3 (23.7, 6.5) -> (23.7, 21.5)
  line L4 (23.7, 21.5) -> (10.2, 21.5)
  line L5 (10.2, 21.5) -> (10.2, 6.5)
  point P0 (0, 29)
  point P1 (13.2, 6.5)
extrude "Extrusão39" add sketch "Esboço53" along normal blind 0.5
sketch "Esboço56" plane through (25.2, 9.8, 30) normal (0, 1, 0) x (1, 0, 0)
  line L0 (0, 0) -> (-31.407, 0) projected
  line L1 (-12.5, 30) -> (-12.5, 0) projected
  line L2 (0, 0) -> (-12.5, 0)
  line L3 (-12.5, 0) -> (-12.5, 28.9999)
  line L4 (-12.5, 28.9999) -> (0, 28.9999)
  line L5 (0, 28.9999) -> (0, 0)
  point P0 (-25.2, 30)
extrude "Extrusão40" cut sketch "Esboço56" against normal blind 8.8
sketch "Esboço57" plane through (-5.4, 1.2, 25.7994) normal (1, 0, 0) x (0, 0, -1)
  circle A0 centre (10.7994, 2.3) radius 1.5 projected
  line L0 (10.7994, 0.8) -> (10.7994, 2.3)
  line L1 (10.7994, 2.3) -> (10.7994, 5.3)
  circle A1 centre (10.7994, 5.3) radius 1.5
  line L2 (12.2994, 2.3) -> (12.2994, 5.3)
  line L3 (9.2994, 2.3) -> (9.2994, 5.3)
  point P0 (25.7994, -1.2)
  dimension "d187" = 3
  dimension "d188" = 3
extrude "Extrusão41" add sketch "Esboço57" along normal blind 12.2 contours A1
sketch "Esboço58" plane through (6.5, 3.5, 15) normal (1, 0, 0) x (0, 0, -1)
  circle A0 centre (0, 0) radius 1.5
  point P0 (15, -3.5)
extrude "Extrusão42" cut sketch "Esboço58" against normal blind 11.9
sketch "Esboço59" plane through (0, 1, 1) normal (0, 1, 0) x (1, 0, 0)
  line L0 (10.2, -3.5) -> (10.2, -24.5) projected
  line L1 (10.2, -24.5) -> (11.2, -24.5)
  line L2 (11.2, -24.5) -> (11.2, -3.5)
  line L3 (11.2, -3.5) -> (10.2, -3.5)
  line L4 (10.2, -3.5) -> (10.2, -24.5)
  point P0 (0, 1)
  dimension "d193" = 1
extrude "Extrusão43" cut sketch "Esboço59" against normal blind 1
sketch "Esboço61" plane through (6.8, 6.5, 15) normal (1, 0, 0) x (0, 0, -1)
  circle A0 centre (0, 0) radius 1.5 projected
  circle A1 centre (0, 0) radius 1.5
  point P0 (15, -6.5)
extrude "Extrusão44" cut sketch "Esboço61" against normal blind 1.8
sketch "Esboço62" plane through (25.2, 9.8, 30) normal (0, 1, 0) x (1, 0, 0)
  line L0 (-31.4, 30) -> (-31.4, 22) projected
  line L1 (-31.4, 29.0001) -> (-31.4, 30)
  line L2 (-31.4, 30) -> (0.1, 30)
  line L3 (0.1, 30) -> (0.1, 22.04)
  line L4 (0.1, 30) -> (-0.9, 30)
  line L5 (-3, 30) -> (0, 30) projected
  line L6 (-0.9, 30) -> (-0.9, 21.04)
  line L7 (-0.9, 21.04) -> (14, 21.04)
  line L8 (0.1, 22.04) -> (15, 22.04)
  line L9 (15, 22.04) -> (15, -2.96)
  line L10 (14, 21.04) -> (14, -1.96)
  line L11 (15, -2.96) -> (0.1, -2.96)
  line L12 (14, -1.96) -> (-0.9, -1.96)
  line L13 (-0.9, -1.96) -> (-0.9, -7.96)
  line L14 (0.1, -2.96) -> (0.1, -8.96)
  line L15 (0.1, -8.96) -> (-11.5, -8.96)
  line L16 (-0.9, -7.96) -> (-10.5, -7.96)
  line L17 (-11.5, -8.96) -> (-11.5, 1)
  line L18 (-10.5, -7.96) -> (-10.5, 1)
  line L19 (-10, 0) -> (-12.5, 0) projected
  line L20 (-25.2, 1) -> (-12.5, 1) projected
  line L21 (-10.5, 1) -> (-12.5, 1)
  line L22 (-12.5, 30) -> (-12.5, 0) projected
  line L23 (-12.5, 1) -> (-12.5, 0)
  line L24 (-12.5, 0) -> (-10.5, 0)
  point P0 (-25.2, 30)
  point P1 (-11.5, 0)
  point P2 (-0.9, 30)
  dimension "d198" = 31.5
  dimension "d199" = 7.96
  dimension "d200" = 1
  dimension "d201" = 8.96
  dimension "d202" = 14.9
  dimension "d203" = 14.9
  dimension "d204" = 25
  dimension "d205" = 23
  dimension "d206" = 14.9
  dimension "d207" = 14.9
  dimension "d208" = 6
  dimension "d209" = 6
  dimension "d210" = 11.6
  dimension "d211" = 9.6
  dimension "d212" = 9.96
  dimension "d213" = 8.96
extrude "Extrusão45" add sketch "Esboço62" against normal blind 8.8 contours L21 L17 L19 L22 | L2 L3 L8 L9 L11 L14 L15 L17 L19 L18 L16 L13 L12 L10 L7 L6 | L21 L18 L19 L17
sketch "Esboço63" plane through (25.2, 9.8, 30) normal (0, 1, 0) x (1, 0, 0)
  line L0 (-31.4, 8) -> (-31.4, 0) projected
  line L1 (-31.407, 1) -> (-10.5, 1) projected
  line L2 (-31.4, 0) -> (-10.5, 0)
  line L3 (-10.5, 0) -> (-10.5, 1)
  line L4 (-10.5, 1) -> (-31.4, 1)
  line L5 (-31.4, 1) -> (-31.4, 0)
  line L6 (-11.5, 0) -> (-11.5, -8.96) projected
  line L7 (-10.5, 1) -> (-11.5, 1)
  line L8 (-11.5, 1) -> (-11.5, -8.96)
  line L9 (-11.5, -8.96) -> (-10.5, -8.96)
  line L10 (-10.5, -8.96) -> (-10.5, 1)
  line L11 (-11.5, -8.96) -> (0.1, -8.96) projected
  line L12 (-10.5, -7.96) -> (-0.9, -7.96) projected
  line L13 (-11.5, -8.96) -> (-0.9, -8.96)
  line L14 (-0.9, -8.96) -> (-0.9, -7.96)
  line L15 (-0.9, -7.96) -> (-11.5, -7.96)
  line L16 (-11.5, -7.96) -> (-11.5, -8.96)
  line L17 (-0.9, -1.96) -> (14, -1.96) projected
  line L18 (-0.9, -8.96) -> (0.1, -8.96)
  line L19 (0.1, -8.96) -> (0.1, -1.96)
  line L20 (0.1, -1.96) -> (-0.9, -1.96)
  line L21 (-0.9, -1.96) -> (-0.9, -8.96)
  line L22 (-0.9, -7.96) -> (-0.9, -1.96) projected
  line L23 (15, 22.04) -> (15, -2.96) projected
  line L24 (-0.9, -1.96) -> (15, -1.96)
  line L25 (15, -1.96) -> (15, -2.96)
  line L26 (15, -2.96) -> (-0.9, -2.96)
  line L27 (-0.9, -2.96) -> (-0.9, -1.96)
  line L28 (15, -2.96) -> (0.1, -2.96) projected
  line L29 (0.1, 22.04) -> (15, 22.04) projected
  line L30 (15, -2.96) -> (14, -2.96)
  line L31 (14, -2.96) -> (14, 22.04)
  line L32 (14, 22.04) -> (15, 22.04)
  line L33 (15, 22.04) -> (15, -2.96)
  line L34 (0, 21.04) -> (-0.9, 21.04) projected
  line L35 (15, 22.04) -> (-0.9, 22.04)
  line L36 (-0.9, 22.04) -> (-0.9, 21.04)
  line L37 (-0.9, 21.04) -> (15, 21.04)
  line L38 (15, 21.04) -> (15, 22.04)
  line L39 (-0.9, 28.9999) -> (-0.9, 21.04) projected
  line L40 (0.1, 30) -> (0.1, 22.04) projected
  line L41 (-0.9, 21.04) -> (0.1, 21.04)
  line L42 (0.1, 21.04) -> (0.1, 30)
  line L43 (0.1, 30) -> (-0.9, 30)
  line L44 (-0.9, 30) -> (-0.9, 21.04)
  line L45 (-31.407, 29) -> (-31.407, 30) projected
  line L46 (0.1, 30) -> (-31.407, 30)
  line L47 (-31.407, 30) -> (-31.407, 29)
  line L48 (-31.407, 29) -> (0.1, 29)
  line L49 (0.1, 29) -> (0.1, 30)
  point P0 (-25.2, 30)
  point P1 (-0.9, 29)
  point P2 (14, 21.04)
  dimension "d216" = 1
  dimension "d217" = 1
extrude "Extrusão46" add sketch "Esboço63" along normal blind 3.2
sketch "Esboço64" plane through (25.2, 1, 30) normal (0, -1, 0) x (1, 0, 0)
  line L0 (0.1, -30) -> (-31.4, -30) projected
  line L1 (0, -30) -> (0.1, -30)
  line L2 (0.1, -22.04) -> (15, -22.04) projected
  line L3 (0.1, -30) -> (0.1, -22.04)
  line L4 (15, -22.04) -> (15, 2.96) projected
  line L5 (15, -22.04) -> (15, 2.96)
  line L6 (15, 2.96) -> (0.1, 2.96)
  line L7 (14, 1.96) -> (-0.9, 1.96) projected
  line L8 (0.1, 2.96) -> (0.1, 8.96) projected
  line L9 (0.1, 2.96) -> (0.1, 8.96)
  line L10 (-11.5, 8.96) -> (-11.5, 0) projected
  line L11 (0.1, 8.96) -> (-11.5, 8.96)
  line L12 (-10.5, 0) -> (-11.5, 0) projected
  line L13 (-11.5, 0) -> (-10.5, 0)
  line L14 (-10.5, 0) -> (-11.5, 0)
  line L15 (-10.5, 0) -> (-10.5, 7.96) projected
  line L16 (0, 0) -> (-10.5, 0) projected
  line L17 (-10.5, 0) -> (0, 0)
  line L18 (0, 0) -> (0, -30) projected
  line L19 (0, -30) -> (0, -21.04) projected
  line L20 (0, 0) -> (0, -30)
  point P0 (-25.2, -30)
extrude "Extrusão47" add sketch "Esboço64" along normal blind 1
properties part number "Peça1,61"
